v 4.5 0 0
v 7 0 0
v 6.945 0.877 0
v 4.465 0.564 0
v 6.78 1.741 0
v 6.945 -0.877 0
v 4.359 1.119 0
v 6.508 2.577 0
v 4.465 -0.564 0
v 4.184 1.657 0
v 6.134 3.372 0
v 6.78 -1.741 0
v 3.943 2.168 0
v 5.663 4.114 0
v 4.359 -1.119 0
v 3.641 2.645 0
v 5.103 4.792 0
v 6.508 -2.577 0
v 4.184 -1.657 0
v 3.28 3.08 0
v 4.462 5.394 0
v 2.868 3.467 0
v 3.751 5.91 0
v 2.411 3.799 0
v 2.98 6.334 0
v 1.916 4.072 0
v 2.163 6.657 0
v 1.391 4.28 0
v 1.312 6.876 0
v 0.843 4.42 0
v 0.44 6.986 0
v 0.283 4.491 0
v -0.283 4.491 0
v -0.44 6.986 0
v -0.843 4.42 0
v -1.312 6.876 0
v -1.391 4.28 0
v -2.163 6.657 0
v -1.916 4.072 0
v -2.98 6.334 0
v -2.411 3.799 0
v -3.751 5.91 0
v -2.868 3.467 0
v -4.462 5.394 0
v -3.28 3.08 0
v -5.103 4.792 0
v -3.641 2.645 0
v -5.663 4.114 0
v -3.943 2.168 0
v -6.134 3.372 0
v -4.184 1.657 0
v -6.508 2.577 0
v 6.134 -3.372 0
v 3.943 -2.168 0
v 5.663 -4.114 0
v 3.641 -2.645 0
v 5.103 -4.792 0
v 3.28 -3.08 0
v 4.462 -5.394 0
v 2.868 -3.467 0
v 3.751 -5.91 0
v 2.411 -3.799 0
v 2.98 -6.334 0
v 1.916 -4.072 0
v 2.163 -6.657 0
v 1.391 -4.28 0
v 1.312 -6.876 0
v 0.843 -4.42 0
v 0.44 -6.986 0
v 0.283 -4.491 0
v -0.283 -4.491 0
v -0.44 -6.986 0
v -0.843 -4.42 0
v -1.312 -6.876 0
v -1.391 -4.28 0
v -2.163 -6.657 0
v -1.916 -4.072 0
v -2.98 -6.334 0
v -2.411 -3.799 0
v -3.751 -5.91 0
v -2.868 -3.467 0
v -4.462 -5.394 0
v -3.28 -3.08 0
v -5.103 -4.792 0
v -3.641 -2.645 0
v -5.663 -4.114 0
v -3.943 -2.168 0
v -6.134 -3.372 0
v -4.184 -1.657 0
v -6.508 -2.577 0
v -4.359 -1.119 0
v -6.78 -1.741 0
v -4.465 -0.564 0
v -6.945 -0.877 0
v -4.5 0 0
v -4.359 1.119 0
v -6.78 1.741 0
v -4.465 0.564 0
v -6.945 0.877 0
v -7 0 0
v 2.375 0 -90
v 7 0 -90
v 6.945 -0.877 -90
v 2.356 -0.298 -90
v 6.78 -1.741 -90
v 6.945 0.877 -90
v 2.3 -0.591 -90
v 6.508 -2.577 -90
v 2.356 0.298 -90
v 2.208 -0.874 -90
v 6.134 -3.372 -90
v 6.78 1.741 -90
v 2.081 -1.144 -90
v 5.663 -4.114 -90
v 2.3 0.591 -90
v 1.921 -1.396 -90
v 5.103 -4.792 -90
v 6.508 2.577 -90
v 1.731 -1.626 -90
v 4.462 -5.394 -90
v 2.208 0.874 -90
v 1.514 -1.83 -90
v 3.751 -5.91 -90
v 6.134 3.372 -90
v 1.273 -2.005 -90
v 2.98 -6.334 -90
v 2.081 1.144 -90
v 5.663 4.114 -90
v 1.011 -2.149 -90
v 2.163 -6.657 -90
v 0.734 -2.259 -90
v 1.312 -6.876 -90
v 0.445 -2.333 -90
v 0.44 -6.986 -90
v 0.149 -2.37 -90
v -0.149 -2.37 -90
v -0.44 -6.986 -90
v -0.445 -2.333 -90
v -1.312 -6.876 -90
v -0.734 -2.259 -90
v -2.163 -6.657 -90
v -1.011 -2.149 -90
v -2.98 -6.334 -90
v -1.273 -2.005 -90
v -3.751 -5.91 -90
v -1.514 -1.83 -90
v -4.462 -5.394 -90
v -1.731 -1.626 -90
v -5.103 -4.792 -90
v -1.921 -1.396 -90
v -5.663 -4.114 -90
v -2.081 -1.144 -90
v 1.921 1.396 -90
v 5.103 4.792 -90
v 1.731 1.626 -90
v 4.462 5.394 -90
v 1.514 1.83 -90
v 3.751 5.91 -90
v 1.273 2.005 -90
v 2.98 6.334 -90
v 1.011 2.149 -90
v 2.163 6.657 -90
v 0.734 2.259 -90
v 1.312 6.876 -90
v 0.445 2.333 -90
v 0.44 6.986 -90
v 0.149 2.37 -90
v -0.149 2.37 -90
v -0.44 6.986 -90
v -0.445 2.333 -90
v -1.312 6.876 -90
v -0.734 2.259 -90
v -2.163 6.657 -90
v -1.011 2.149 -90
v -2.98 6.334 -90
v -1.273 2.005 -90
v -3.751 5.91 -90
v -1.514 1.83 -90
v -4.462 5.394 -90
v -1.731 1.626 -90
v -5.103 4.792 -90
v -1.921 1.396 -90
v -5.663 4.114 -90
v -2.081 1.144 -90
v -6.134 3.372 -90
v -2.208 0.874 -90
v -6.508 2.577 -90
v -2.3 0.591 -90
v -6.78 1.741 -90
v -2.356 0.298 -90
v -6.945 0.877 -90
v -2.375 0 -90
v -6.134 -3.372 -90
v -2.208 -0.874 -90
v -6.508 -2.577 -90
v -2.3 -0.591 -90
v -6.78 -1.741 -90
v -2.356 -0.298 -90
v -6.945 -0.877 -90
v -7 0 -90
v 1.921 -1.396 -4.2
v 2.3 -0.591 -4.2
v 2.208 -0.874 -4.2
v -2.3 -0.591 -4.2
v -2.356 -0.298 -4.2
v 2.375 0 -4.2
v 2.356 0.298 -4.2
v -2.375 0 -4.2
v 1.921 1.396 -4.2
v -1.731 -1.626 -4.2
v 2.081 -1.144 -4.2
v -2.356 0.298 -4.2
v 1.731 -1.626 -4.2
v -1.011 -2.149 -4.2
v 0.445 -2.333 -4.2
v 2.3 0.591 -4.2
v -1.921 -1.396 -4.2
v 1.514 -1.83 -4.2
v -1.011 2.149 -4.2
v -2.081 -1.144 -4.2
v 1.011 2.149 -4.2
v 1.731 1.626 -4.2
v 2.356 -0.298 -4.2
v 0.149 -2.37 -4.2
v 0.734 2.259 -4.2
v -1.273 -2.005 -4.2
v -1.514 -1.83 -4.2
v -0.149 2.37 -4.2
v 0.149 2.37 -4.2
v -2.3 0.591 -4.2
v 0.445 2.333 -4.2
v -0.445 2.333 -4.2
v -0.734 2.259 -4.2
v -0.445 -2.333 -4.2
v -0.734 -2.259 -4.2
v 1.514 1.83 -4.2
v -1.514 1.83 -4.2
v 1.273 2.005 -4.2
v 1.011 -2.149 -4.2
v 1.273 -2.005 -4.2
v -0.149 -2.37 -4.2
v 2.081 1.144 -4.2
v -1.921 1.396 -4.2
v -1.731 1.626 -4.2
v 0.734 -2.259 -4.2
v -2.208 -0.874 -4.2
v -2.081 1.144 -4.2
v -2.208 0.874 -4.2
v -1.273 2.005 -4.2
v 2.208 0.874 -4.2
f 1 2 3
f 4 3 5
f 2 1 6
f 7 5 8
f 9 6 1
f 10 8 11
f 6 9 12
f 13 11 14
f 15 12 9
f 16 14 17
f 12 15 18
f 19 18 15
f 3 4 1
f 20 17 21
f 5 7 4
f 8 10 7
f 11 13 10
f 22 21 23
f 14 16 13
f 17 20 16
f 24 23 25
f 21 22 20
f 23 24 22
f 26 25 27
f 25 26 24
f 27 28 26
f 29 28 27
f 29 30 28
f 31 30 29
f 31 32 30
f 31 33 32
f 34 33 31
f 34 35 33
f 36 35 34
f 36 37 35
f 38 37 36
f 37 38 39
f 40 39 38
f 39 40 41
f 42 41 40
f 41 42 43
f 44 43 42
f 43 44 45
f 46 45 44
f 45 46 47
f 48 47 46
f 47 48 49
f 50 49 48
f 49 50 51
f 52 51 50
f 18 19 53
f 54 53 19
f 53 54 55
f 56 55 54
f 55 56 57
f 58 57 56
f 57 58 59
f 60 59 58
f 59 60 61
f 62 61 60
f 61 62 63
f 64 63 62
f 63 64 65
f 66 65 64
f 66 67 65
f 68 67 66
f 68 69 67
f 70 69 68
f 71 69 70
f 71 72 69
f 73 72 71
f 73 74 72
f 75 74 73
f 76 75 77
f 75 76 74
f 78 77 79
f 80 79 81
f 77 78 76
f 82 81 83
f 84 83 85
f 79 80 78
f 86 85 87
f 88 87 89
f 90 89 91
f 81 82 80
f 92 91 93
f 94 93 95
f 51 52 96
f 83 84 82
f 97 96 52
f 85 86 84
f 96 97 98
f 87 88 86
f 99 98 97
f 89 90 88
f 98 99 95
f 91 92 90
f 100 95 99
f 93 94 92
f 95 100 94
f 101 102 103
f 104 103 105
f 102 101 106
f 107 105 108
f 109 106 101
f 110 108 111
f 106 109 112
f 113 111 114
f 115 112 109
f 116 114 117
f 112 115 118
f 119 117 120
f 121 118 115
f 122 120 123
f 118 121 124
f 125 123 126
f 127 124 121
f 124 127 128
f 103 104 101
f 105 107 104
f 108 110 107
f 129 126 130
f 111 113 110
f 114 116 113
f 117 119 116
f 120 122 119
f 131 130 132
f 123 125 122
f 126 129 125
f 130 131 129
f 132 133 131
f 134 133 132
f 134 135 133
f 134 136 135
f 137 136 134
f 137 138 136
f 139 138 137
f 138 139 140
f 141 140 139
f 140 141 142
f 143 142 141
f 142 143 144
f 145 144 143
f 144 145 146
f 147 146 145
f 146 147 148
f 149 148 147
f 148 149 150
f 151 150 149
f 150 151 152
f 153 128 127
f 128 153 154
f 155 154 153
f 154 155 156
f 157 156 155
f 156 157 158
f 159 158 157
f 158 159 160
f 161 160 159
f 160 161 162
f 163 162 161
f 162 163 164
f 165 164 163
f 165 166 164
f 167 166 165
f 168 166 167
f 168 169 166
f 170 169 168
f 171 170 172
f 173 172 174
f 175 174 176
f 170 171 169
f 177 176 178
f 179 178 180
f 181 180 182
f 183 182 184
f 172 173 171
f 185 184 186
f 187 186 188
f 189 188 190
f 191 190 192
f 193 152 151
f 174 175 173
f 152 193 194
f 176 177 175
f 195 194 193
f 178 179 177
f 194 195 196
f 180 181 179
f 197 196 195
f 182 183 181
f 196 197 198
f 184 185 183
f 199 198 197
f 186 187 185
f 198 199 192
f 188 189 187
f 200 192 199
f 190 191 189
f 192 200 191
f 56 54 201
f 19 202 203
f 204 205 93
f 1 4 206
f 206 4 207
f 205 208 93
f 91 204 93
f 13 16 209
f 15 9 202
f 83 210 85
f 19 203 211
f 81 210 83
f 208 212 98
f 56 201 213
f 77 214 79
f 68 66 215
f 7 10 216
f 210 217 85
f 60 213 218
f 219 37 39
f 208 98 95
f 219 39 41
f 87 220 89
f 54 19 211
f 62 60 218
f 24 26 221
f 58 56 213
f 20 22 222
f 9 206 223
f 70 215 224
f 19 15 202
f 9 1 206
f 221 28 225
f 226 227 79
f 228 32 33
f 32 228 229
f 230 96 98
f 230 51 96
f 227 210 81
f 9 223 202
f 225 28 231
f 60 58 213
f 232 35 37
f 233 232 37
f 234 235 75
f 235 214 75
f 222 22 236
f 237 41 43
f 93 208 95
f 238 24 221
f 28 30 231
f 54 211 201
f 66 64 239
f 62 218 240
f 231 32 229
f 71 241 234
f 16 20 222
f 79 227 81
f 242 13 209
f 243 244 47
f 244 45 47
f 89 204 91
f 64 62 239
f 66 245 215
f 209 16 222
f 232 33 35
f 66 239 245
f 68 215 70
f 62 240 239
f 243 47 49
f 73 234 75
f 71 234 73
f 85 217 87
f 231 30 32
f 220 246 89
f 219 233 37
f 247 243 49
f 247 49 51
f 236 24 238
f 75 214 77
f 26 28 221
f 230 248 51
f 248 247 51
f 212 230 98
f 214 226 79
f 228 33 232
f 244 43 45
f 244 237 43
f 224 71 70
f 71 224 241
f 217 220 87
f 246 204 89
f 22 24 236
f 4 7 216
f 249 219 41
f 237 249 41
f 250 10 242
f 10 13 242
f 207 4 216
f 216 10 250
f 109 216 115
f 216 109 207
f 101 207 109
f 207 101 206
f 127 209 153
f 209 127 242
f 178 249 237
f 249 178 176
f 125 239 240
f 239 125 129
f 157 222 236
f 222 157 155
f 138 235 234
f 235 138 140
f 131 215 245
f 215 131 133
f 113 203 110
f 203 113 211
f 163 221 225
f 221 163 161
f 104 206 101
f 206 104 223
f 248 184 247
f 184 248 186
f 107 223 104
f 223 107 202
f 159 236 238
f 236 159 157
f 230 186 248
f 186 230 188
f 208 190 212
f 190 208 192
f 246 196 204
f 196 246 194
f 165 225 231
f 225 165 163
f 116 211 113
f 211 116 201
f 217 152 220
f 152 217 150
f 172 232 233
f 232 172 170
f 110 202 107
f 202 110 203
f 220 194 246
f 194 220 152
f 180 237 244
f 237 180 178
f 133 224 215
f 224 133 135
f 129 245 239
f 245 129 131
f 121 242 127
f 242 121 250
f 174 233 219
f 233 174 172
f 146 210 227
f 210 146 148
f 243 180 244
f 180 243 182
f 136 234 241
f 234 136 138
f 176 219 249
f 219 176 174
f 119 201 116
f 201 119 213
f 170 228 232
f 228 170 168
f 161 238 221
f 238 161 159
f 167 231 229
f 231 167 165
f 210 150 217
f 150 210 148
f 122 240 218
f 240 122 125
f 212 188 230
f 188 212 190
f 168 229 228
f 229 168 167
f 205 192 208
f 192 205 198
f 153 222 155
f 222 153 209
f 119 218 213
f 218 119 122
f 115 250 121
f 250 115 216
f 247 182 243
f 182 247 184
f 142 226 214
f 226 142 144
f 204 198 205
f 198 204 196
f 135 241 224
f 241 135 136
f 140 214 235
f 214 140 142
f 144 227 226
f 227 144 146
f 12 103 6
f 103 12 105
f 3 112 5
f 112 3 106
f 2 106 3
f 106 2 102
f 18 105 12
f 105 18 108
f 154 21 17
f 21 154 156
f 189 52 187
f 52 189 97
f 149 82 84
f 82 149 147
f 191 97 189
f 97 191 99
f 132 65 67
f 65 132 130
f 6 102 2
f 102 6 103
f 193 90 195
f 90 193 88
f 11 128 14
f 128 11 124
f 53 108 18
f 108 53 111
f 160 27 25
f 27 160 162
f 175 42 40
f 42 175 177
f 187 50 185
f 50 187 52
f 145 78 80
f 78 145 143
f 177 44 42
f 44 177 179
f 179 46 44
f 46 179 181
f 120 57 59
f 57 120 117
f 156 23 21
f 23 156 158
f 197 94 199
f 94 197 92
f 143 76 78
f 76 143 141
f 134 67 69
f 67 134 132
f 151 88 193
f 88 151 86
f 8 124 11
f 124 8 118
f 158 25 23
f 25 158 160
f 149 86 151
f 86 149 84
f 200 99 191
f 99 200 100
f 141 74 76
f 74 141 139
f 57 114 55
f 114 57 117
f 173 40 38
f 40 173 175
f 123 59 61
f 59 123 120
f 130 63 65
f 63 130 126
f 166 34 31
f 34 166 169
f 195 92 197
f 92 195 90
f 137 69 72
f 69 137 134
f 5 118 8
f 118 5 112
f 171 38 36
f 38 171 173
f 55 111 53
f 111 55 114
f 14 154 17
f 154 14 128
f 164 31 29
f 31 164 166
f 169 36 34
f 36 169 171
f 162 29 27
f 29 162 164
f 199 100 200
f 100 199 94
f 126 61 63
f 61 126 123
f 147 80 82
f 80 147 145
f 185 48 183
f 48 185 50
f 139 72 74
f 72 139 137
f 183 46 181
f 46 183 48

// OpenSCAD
$fn = 50;


difference() {
	union() {
		translate(v = [0, 0, -90.0000000000]) {
			cylinder(h = 90, r = 7.0000000000);
		}
		cylinder(h = 0, r = 13.0000000000);
	}
	union() {
		translate(v = [0, 0, 0]) {
			rotate(a = [0, 0, 0]) {
				difference() {
					union() {
						#translate(v = [0, 0, -90.0000000000]) {
							cylinder(h = 90, r = 2.2500000000);
						}
						#translate(v = [0, 0, -4.2000000000]) {
							cylinder(h = 4.2000000000, r1 = 2.3750000000, r2 = 4.5000000000);
						}
						#translate(v = [0, 0, -90.0000000000]) {
							cylinder(h = 90, r = 2.3750000000);
						}
						#translate(v = [0, 0, -90.0000000000]) {
							cylinder(h = 90, r = 2.2500000000);
						}
					}
					union();
				}
			}
		}
	}
}
